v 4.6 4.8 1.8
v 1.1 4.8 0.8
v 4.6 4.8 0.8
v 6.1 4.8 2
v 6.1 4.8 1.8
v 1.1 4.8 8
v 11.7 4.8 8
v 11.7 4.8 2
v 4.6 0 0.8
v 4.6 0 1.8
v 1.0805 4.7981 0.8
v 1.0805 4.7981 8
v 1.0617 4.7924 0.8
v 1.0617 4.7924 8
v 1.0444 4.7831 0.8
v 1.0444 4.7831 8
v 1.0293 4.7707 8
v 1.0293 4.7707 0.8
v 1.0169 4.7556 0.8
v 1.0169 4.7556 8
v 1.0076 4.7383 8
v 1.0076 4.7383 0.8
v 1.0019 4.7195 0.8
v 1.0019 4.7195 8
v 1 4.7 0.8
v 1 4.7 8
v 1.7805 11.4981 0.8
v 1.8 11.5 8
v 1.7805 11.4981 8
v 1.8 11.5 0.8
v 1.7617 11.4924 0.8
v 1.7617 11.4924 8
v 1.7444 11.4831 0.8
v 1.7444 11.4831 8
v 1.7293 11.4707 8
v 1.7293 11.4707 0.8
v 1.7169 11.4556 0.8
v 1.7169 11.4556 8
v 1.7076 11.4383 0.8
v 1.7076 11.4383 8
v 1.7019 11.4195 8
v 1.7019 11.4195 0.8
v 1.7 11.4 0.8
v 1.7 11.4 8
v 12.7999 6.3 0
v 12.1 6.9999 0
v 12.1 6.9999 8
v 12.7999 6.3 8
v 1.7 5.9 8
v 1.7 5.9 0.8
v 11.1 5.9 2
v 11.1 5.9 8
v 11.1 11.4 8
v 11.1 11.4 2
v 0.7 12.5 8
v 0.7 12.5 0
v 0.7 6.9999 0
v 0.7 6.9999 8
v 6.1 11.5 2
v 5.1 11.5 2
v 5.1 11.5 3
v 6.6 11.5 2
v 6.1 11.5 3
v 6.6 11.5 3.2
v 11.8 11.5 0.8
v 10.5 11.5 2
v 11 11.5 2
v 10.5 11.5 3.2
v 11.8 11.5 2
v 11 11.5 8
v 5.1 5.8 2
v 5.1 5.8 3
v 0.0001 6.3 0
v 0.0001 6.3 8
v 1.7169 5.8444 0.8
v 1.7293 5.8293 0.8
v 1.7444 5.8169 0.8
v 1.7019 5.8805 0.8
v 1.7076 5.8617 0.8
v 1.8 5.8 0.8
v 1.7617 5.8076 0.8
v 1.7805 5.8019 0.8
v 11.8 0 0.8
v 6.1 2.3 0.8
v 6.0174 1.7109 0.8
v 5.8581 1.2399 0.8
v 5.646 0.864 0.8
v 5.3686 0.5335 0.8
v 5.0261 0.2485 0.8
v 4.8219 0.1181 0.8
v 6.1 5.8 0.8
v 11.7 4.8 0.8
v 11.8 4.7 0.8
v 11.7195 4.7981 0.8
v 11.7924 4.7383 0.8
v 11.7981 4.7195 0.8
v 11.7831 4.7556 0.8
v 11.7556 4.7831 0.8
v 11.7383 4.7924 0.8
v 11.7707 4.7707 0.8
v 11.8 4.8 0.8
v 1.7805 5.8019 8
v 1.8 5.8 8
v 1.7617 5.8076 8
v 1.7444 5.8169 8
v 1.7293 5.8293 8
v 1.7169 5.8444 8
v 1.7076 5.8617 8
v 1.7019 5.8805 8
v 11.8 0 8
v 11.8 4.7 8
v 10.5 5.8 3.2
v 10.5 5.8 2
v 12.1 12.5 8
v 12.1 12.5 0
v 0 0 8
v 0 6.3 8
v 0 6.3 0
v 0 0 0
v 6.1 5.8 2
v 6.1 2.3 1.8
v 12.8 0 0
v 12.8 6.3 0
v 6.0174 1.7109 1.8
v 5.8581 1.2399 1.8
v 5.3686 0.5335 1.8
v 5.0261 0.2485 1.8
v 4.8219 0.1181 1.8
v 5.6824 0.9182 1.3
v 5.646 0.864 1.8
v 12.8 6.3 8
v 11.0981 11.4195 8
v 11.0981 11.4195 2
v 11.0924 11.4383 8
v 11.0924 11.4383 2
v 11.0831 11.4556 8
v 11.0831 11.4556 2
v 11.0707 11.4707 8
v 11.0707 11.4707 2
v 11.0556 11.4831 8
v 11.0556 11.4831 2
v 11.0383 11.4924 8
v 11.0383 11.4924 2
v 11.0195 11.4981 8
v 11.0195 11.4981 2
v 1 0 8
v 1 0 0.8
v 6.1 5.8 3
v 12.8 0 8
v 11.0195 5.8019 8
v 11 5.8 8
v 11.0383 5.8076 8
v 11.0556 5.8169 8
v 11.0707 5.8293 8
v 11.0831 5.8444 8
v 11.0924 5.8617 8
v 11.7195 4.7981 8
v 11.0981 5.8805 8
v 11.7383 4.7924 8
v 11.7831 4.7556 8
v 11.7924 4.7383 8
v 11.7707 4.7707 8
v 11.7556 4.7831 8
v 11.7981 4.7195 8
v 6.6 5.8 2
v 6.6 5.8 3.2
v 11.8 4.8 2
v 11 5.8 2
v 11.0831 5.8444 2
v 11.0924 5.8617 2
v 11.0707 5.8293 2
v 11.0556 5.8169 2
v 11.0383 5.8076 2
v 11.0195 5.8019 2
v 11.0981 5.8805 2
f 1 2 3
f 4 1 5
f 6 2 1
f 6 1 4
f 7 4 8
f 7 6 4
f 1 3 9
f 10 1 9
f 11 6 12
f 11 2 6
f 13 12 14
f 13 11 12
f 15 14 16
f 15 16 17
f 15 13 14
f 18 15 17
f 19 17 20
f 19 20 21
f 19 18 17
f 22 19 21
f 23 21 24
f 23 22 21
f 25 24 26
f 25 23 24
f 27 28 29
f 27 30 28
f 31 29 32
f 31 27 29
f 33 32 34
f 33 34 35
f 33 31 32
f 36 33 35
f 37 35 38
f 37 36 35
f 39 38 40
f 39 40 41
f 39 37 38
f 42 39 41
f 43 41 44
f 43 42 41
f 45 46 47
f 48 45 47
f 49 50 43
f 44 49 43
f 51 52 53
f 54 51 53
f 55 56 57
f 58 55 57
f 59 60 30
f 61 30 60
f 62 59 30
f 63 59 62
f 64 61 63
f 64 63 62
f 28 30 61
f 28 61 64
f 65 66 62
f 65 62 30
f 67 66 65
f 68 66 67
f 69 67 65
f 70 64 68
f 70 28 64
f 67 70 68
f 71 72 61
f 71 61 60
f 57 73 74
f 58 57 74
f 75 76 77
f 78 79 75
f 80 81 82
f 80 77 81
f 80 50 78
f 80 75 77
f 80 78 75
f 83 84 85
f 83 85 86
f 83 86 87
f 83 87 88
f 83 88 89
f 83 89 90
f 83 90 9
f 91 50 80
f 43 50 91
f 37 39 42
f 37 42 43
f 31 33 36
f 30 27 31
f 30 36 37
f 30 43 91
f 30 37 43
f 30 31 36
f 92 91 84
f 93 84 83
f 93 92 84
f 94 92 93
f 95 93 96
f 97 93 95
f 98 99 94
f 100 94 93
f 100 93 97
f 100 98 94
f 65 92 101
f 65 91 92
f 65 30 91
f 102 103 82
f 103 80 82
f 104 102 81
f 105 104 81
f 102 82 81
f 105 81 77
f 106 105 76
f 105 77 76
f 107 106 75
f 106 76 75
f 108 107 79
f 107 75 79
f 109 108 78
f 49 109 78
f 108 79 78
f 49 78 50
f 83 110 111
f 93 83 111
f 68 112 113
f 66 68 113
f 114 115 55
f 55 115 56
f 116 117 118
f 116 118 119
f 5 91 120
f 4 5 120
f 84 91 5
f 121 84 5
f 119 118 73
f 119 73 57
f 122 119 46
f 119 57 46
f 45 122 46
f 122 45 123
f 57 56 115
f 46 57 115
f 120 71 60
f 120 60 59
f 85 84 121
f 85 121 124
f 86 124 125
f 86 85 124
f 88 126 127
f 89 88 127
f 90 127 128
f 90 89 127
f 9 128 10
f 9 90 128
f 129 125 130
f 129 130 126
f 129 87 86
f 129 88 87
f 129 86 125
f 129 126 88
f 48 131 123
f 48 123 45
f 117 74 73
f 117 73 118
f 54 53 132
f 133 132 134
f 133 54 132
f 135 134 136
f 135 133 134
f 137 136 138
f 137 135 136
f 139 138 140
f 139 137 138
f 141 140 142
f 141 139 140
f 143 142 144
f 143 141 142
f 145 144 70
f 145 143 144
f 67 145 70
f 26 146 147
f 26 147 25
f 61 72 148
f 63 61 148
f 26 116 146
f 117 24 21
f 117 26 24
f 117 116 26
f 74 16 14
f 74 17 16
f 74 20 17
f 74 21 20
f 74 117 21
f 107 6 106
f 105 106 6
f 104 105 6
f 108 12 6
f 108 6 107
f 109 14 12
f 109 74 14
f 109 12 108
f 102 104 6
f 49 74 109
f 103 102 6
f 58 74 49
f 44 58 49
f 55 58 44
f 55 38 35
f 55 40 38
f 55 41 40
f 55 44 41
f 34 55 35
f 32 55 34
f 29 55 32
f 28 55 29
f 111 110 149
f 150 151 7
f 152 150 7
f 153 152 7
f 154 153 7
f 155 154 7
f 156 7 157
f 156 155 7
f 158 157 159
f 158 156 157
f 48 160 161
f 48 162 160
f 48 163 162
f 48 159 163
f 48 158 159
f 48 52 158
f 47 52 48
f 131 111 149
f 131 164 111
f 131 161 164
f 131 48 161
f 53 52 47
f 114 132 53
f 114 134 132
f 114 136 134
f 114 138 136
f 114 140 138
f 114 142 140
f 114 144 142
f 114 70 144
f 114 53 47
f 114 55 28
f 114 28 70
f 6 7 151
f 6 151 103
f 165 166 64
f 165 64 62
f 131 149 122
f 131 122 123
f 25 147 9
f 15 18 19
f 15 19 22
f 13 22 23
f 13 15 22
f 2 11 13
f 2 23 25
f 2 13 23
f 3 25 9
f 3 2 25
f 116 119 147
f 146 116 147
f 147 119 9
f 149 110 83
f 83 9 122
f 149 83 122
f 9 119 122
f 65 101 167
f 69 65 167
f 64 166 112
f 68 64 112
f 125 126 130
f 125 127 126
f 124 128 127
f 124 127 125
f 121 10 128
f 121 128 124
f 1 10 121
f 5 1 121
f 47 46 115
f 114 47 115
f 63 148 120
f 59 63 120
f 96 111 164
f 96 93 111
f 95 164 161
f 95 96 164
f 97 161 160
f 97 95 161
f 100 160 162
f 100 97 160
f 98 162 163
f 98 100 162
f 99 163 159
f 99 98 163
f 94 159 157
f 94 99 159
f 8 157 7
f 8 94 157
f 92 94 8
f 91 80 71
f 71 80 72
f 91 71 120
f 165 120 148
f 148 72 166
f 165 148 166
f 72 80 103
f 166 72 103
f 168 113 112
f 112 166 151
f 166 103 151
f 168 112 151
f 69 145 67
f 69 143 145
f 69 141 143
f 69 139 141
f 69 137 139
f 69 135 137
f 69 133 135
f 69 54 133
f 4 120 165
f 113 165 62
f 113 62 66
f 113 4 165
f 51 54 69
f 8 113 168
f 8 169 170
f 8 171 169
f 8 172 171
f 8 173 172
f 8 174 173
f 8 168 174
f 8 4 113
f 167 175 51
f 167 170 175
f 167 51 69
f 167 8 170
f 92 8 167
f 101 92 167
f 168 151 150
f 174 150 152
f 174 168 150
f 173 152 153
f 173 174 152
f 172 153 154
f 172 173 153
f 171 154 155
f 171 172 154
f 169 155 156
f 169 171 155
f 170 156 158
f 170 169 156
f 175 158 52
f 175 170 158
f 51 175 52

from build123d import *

# Parameters (mm, degrees)
EXTRUDE_1_DEPTH     = 8
CHAMFER_1_SIZE      = 0.7
SKETCH_3_W          = 10.8
SKETCH_3_H          = 4.8
SKETCH_3_W_2        = 9.4
SKETCH_3_H_2        = 5.7
CUT_EXTRUDE_1_DEPTH = 7.2
FILLET_1_R          = 0.1
CUT_EXTRUDE_2_REACH = 18.945
SKETCH_4_W          = 5.7
SKETCH_4_H          = 1.2
EXTRUDE_2_REACH     = 18.515
SKETCH_5_W          = 3.9
SKETCH_5_H          = 1.2
EXTRUDE_3_DEPTH     = 1
EXTRUDE_4_REACH     = 18.515
SKETCH_7_W          = 1
SKETCH_7_H          = 1


with BuildPart() as part:
    # ｽｹｯﾁ1 → ﾎﾞｽ - 押し出し1 (new body)
    with BuildSketch(Plane.XY):
        Polygon((0, 6.3), (0, 0), (12.8, 0), (12.8, 6.3), (12.1, 6.3), (12.1, 12.5), (0.7, 12.5), (0.7, 6.3), align=None)
    extrude(amount=EXTRUDE_1_DEPTH)

    # 面取り1
    chamfer_1_edges = [part.edges().sort_by_distance(p)[0] for p in [
        (0.7, 6.3, 4),
        (12.1, 6.3, 4),
    ]]
    chamfer(chamfer_1_edges, length=CHAMFER_1_SIZE - 0.0001)  # a hair under: the kernel refuses the full size

    # ｽｹｯﾁ3 → ｶｯﾄ - 押し出し1 (cut)
    with BuildSketch(Plane.XY.offset(8)):
        with Locations((6.4, 2.4)):
            Rectangle(SKETCH_3_W, SKETCH_3_H)
        with Locations((6.4, 8.65)):
            Rectangle(SKETCH_3_W_2, SKETCH_3_H_2)
    extrude(amount=-CUT_EXTRUDE_1_DEPTH, mode=Mode.SUBTRACT)

    # ﾌｨﾚｯﾄ1
    fillet_1_edges = [part.edges().sort_by_distance(p)[0] for p in [
        (1, 4.8, 4.4),
        (11.8, 4.8, 4.4),
        (11.1, 11.5, 4.4),
        (11.1, 5.8, 4.4),
        (1.7, 5.8, 4.4),
        (1.7, 11.5, 4.4),
    ]]
    fillet(fillet_1_edges, radius=FILLET_1_R)

    # ｶｯﾄ - 押し出し2: up to this face of the body (flat: up to its plane)
    cut_extrude_2_end = Plane(part.part.faces().sort_by_distance((6.4, 11.5, 4.4))[0])
    # ｽｹｯﾁ4 → ｶｯﾄ - 押し出し2 (cut, up to the picked face)
    with BuildSketch(Plane.XZ.offset(-4.8), mode=Mode.PRIVATE) as cut_extrude_2_sk1:
        with Locations((8.95, 1.4)):
            Rectangle(SKETCH_4_W, SKETCH_4_H)
    cut_extrude_2_tool1 = split(extrude(cut_extrude_2_sk1.sketch, amount=-CUT_EXTRUDE_2_REACH, mode=Mode.PRIVATE), bisect_by=cut_extrude_2_end, keep=Keep.BOTH, mode=Mode.PRIVATE)
    add(cut_extrude_2_tool1.solids().sort_by(Axis((8.95, 4.8, 1.4), (0, 1, 0)))[0], mode=Mode.SUBTRACT)

    # ｽｹｯﾁ5 → ﾎﾞｽ - 押し出し2 (add, up to next)
    with BuildSketch(Plane(origin=(0, 5.8, 0), x_dir=(1, 0, 0), z_dir=(0, 1, 0)), mode=Mode.PRIVATE) as extrude_2_sk1:
        with Locations((8.55, -2.6)):
            Rectangle(SKETCH_5_W, SKETCH_5_H)
    extrude_2_tool1 = extrude(extrude_2_sk1.sketch, amount=EXTRUDE_2_REACH, mode=Mode.PRIVATE) - part.part
    add(extrude_2_tool1.solids().sort_by_distance((8.55, 5.8, 2.6))[0])

    # ｽｹｯﾁ6 → ﾎﾞｽ - 押し出し3 (add)
    with BuildSketch(Plane.XY.offset(0.8)):
        with BuildLine():
            Line((4.6, 4.8), (4.6, 0))
            add(Edge.make_bspline(
                [(6.1, 2.3), (6.014846431, 0.686411096), (4.6, 0)],
                knots=[0, 0, 0, 1, 1, 1], degree=2))
            Line((6.1, 2.3), (6.1, 4.8))
            Line((6.1, 4.8), (4.6, 4.8))
        make_face()
    extrude(amount=EXTRUDE_3_DEPTH)

    # ｽｹｯﾁ7 → ﾎﾞｽ - 押し出し4 (add, up to next)
    with BuildSketch(Plane(origin=(0, 5.8, 0), x_dir=(1, 0, 0), z_dir=(0, 1, 0)), mode=Mode.PRIVATE) as extrude_4_sk1:
        with Locations((5.6, -2.5)):
            Rectangle(SKETCH_7_W, SKETCH_7_H)
    extrude_4_tool1 = extrude(extrude_4_sk1.sketch, amount=EXTRUDE_4_REACH, mode=Mode.PRIVATE) - part.part
    add(extrude_4_tool1.solids().sort_by_distance((5.6, 5.8, 2.5))[0])


solid = part.part
